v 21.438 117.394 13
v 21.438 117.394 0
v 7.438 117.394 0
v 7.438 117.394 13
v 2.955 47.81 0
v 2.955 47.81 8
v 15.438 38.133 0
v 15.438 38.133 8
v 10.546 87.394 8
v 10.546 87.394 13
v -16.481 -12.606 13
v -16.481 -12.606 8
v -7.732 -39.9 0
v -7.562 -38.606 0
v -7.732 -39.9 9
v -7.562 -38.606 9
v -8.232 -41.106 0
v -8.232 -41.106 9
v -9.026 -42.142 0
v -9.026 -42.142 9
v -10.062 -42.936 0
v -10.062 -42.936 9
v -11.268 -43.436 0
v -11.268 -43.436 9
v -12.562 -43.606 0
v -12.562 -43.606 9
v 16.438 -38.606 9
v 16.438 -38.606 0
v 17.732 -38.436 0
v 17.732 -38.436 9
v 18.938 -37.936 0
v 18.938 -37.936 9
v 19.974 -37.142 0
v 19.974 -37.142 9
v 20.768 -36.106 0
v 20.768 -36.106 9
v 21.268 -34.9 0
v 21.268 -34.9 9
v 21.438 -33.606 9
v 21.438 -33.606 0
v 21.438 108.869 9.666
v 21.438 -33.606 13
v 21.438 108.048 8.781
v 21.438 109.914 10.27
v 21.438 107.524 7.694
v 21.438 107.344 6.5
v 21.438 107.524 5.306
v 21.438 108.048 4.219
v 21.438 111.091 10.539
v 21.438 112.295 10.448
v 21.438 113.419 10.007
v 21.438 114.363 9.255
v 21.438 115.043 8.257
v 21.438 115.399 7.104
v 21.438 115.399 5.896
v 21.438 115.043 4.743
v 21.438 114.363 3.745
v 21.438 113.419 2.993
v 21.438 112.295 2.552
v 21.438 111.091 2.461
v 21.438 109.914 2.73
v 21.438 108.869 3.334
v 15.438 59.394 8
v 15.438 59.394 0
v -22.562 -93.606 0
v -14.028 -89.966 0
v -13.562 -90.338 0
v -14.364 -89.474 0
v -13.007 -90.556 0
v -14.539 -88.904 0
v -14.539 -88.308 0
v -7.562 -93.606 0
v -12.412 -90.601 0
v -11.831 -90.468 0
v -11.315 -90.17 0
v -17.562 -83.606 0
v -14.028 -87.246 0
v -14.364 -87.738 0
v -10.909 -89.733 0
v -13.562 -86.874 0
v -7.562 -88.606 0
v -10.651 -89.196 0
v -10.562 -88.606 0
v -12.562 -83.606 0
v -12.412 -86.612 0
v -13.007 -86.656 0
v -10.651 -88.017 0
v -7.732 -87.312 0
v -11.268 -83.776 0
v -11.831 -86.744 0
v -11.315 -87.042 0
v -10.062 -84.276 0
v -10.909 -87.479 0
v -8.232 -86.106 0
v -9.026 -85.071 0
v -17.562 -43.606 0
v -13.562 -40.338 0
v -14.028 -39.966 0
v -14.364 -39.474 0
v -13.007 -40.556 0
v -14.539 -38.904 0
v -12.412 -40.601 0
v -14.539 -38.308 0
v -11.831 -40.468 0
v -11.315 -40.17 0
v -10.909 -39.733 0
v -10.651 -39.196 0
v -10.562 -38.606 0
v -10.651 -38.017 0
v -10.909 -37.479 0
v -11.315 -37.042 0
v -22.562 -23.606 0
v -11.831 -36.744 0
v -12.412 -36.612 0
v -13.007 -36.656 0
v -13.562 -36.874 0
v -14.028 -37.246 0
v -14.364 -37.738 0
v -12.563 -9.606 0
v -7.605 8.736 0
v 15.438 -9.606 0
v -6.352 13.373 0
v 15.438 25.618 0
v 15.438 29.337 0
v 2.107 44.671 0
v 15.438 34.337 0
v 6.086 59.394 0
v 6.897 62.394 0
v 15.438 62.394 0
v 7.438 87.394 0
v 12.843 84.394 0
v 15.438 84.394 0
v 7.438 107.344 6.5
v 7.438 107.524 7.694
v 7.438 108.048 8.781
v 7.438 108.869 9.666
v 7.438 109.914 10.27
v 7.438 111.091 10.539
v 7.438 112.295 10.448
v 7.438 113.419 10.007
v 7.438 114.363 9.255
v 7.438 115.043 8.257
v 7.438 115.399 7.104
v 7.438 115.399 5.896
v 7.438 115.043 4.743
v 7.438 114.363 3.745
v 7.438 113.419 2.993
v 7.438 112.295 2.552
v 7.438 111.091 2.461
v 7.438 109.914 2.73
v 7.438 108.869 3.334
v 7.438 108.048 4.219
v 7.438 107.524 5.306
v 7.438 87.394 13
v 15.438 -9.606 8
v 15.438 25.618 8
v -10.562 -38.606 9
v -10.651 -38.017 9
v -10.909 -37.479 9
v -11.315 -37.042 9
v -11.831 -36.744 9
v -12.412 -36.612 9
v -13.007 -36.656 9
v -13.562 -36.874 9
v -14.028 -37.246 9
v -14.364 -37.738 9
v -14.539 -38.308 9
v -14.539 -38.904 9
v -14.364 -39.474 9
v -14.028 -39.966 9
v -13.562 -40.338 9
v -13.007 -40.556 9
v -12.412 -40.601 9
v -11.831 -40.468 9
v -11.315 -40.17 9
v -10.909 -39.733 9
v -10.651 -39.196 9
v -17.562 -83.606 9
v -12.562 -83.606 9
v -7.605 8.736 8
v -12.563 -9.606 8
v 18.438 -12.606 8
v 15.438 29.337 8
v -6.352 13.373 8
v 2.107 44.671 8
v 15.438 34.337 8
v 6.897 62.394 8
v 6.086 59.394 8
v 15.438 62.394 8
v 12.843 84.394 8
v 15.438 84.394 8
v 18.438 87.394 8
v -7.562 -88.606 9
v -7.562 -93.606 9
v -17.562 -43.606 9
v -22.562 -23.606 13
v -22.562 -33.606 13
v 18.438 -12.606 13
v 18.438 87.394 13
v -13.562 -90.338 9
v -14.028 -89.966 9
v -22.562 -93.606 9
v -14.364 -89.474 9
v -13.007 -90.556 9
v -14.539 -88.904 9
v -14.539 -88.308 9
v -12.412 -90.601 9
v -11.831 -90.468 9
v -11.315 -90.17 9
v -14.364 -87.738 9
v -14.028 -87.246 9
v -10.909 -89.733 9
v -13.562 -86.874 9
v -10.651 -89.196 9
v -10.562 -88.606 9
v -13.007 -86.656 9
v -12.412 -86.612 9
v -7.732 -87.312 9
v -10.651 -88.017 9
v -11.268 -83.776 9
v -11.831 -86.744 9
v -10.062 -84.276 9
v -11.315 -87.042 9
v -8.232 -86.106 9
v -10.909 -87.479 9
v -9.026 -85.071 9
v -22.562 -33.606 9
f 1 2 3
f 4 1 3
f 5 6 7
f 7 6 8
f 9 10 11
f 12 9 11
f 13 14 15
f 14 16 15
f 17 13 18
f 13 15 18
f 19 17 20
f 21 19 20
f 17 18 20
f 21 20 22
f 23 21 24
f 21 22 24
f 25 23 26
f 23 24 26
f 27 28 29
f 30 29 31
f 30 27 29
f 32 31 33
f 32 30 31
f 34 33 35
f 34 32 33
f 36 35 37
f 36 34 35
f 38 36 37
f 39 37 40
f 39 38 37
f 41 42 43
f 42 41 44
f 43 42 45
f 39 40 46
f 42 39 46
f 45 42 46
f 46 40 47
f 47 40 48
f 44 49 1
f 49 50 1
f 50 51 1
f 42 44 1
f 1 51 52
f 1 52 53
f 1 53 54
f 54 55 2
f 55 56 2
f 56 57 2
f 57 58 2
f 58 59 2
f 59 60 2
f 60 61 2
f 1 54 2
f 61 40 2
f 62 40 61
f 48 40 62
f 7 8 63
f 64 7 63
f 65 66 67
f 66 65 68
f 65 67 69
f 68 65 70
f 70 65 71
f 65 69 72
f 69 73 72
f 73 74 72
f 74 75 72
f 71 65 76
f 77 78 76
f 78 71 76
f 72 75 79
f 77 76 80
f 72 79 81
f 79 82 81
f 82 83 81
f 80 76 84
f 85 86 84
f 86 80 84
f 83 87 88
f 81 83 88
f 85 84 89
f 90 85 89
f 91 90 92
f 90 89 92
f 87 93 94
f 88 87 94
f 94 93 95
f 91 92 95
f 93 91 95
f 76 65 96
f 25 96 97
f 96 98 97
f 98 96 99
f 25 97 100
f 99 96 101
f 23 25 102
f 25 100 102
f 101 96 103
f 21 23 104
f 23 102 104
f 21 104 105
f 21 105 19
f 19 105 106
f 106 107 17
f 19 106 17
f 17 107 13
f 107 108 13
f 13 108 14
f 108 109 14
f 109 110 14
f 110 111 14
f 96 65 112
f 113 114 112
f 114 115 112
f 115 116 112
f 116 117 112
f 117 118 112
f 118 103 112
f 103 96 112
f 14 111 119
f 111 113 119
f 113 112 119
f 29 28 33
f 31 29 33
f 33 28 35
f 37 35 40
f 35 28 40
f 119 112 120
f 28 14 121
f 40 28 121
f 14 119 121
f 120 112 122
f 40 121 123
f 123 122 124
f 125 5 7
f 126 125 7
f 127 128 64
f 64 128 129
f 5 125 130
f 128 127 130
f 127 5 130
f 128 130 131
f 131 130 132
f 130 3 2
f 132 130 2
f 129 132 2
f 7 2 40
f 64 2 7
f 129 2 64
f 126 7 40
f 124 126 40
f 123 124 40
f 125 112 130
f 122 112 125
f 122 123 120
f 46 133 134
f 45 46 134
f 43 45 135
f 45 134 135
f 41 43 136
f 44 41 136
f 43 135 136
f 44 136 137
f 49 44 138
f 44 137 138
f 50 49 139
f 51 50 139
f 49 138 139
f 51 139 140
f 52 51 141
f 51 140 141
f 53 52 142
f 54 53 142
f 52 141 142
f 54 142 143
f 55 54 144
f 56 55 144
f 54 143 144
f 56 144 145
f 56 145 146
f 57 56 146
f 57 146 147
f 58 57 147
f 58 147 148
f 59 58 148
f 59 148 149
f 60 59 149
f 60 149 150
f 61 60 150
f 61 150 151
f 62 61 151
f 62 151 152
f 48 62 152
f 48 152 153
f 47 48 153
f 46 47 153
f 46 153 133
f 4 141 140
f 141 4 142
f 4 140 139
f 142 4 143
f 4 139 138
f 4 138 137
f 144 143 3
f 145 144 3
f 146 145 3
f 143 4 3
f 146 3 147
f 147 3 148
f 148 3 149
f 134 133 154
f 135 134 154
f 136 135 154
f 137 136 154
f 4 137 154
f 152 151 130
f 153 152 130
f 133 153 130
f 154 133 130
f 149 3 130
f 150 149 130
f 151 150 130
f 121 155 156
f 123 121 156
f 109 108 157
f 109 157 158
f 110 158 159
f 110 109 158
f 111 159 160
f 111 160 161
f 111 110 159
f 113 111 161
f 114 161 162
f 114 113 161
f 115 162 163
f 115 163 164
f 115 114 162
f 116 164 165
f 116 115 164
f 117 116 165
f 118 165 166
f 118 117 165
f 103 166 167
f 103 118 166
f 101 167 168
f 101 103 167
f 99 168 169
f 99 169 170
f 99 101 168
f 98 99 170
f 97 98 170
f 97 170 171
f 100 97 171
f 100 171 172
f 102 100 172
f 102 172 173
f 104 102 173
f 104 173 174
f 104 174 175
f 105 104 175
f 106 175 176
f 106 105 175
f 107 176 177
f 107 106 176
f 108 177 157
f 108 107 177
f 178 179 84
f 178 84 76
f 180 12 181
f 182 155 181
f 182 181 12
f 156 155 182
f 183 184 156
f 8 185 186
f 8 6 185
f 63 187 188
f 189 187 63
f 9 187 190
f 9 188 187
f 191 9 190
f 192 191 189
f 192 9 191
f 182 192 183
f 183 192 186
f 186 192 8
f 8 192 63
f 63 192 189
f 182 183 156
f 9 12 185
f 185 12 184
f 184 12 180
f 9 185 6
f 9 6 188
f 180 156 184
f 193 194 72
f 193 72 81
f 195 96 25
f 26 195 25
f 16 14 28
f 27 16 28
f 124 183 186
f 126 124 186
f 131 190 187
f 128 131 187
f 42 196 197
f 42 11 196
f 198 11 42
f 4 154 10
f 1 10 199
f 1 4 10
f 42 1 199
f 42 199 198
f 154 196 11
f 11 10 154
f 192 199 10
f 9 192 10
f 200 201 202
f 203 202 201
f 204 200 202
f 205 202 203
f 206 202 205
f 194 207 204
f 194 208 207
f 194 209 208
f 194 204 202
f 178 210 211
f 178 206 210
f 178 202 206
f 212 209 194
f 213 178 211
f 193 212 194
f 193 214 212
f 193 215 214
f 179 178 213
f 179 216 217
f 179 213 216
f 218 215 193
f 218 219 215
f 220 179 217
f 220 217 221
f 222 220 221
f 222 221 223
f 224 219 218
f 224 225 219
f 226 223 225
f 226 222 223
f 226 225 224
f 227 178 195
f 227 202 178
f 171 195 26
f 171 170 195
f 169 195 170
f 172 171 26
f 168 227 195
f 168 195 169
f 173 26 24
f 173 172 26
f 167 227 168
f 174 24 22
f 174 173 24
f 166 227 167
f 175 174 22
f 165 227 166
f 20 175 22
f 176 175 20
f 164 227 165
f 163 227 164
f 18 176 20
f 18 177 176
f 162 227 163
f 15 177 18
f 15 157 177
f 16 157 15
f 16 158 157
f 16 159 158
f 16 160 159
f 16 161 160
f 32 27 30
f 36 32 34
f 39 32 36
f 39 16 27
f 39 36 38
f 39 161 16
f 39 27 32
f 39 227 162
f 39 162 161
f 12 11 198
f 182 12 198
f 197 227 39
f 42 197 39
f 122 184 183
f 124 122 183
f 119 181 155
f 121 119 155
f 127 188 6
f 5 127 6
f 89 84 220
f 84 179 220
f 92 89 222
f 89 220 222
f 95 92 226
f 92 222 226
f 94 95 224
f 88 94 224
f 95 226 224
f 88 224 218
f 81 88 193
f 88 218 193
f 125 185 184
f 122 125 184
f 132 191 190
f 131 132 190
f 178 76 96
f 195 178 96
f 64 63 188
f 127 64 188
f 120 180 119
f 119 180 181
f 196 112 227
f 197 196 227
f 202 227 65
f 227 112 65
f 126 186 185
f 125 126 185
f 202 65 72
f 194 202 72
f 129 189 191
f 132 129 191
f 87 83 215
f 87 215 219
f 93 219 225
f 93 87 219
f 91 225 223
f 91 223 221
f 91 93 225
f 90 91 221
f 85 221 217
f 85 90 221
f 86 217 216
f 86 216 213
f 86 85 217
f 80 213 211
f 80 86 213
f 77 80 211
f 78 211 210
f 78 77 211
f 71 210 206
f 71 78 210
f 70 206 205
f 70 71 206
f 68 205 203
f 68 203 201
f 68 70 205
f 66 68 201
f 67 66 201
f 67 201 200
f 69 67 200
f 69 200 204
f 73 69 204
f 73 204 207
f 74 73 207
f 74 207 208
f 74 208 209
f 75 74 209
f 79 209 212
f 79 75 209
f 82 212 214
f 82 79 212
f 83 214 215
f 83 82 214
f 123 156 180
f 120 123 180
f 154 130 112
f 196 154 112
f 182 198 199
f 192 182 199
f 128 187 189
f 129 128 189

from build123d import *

# Parameters (mm, degrees)
F1_DEPTH  = 13
F0_R      = 2
F2_DEPTH  = 9
F4_DEPTH  = 5
F6_DEPTH  = 8.001
F7_R      = 5
F8_R      = 4.99999
F9_R      = 5
F10_R     = 4.05
F11_DEPTH = 14.001


# Not quite as in the source:
# - a fillet or chamfer is up to 0.001 mm smaller than in the source, because OpenCascade refuses the exact size


with BuildPart() as f1:
    # F0 (on Top) → F1 (new body)
    with BuildSketch(Plane.XY):
        Polygon((-22.5616768954, -33.6060966955), (21.4383231046, -33.6060966955), (21.4383231046, 117.3939033045), (7.4383231046, 117.3939033045), (7.4383231046, 87.3939033045), (-22.5616768954, -23.6060966955), align=None)
    extrude(amount=F1_DEPTH)

    # F0 (on Top) → F2 (join)
    with BuildSketch(Plane.XY):
        Polygon((-17.5616768954, -43.6060966955), (-7.5616768954, -43.6060966955), (-7.5616768954, -38.6060966955), (21.4383231046, -38.6060966955), (21.4383231046, -33.6060966955), (-22.5616768954, -33.6060966955), (-22.5616768954, -93.6060966955), (-7.5616768954, -93.6060966955), (-7.5616768954, -83.6060966955), (-17.5616768954, -83.6060966955), align=None)
        with Locations((-12.5616768954, -88.6060966955)):
            Circle(F0_R, mode=Mode.SUBTRACT)
        with Locations((-12.5616768954, -38.6060966955)):
            Circle(F0_R, mode=Mode.SUBTRACT)
    extrude(amount=F2_DEPTH)

    # F3 (on face) → F4 (cut)
    with BuildSketch(Plane.XY.offset(13)):
        Polygon((-16.4810658851, -12.6060966955), (18.4383231046, -12.6060966955), (18.4383231046, 87.3939033045), (10.545961142, 87.3939033045), align=None)
    extrude(amount=-F4_DEPTH, mode=Mode.SUBTRACT)

    # F5 (on face) → F6 (cut, through all)
    with BuildSketch(Plane.XY.offset(8)):
        Polygon((15.4383231046, 62.3939033045), (15.4383231046, 84.3939033045), (12.8427883685, 84.3939033045), (6.8968424225, 62.3939033045), align=None)
        Polygon((15.4383231046, 38.1328739976), (15.4383231046, 59.3939033045), (6.0860316117, 59.3939033045), (2.95512331, 47.8095425882), align=None)
        Polygon((15.4383231046, 29.3370774792), (15.4383231046, 34.3370774792), (2.1069338573, 44.6712416135), (-6.3520655178, 13.3729439254), align=None)
        Polygon((15.4383231046, -9.6060966955), (15.4383231046, 25.6181227456), (-7.6053455592, 8.7358077721), (-12.562617037, -9.6060966955), align=None)
    extrude(amount=-F6_DEPTH, mode=Mode.SUBTRACT)

    # F7
    f7_edges = [f1.edges().sort_by_distance(p)[0] for p in [
        (21.438323, -38.606097, 4.5),
    ]]
    fillet(f7_edges, radius=F7_R)

    # F8 (radius 5 in the source; OpenCascade refuses exactly that, so slightly less here)
    f8_edges = [f1.edges().sort_by_distance(p)[0] for p in [
        (-7.561677, -43.606097, 4.5),
    ]]
    fillet(f8_edges, radius=F8_R)

    # F9
    f9_edges = [f1.edges().sort_by_distance(p)[0] for p in [
        (-7.561677, -83.606097, 4.5),
    ]]
    fillet(f9_edges, radius=F9_R)

    # F10 (on face) → F11 (cut, through all)
    with BuildSketch(Plane(origin=(7.4383231046, 0, 0), x_dir=(0, -1, 0), z_dir=(-1, 0, 0))):
        with Locations((-111.3939033045, 6.5)):
            Circle(F10_R)
    extrude(amount=-F11_DEPTH, mode=Mode.SUBTRACT)


solid = f1.part
